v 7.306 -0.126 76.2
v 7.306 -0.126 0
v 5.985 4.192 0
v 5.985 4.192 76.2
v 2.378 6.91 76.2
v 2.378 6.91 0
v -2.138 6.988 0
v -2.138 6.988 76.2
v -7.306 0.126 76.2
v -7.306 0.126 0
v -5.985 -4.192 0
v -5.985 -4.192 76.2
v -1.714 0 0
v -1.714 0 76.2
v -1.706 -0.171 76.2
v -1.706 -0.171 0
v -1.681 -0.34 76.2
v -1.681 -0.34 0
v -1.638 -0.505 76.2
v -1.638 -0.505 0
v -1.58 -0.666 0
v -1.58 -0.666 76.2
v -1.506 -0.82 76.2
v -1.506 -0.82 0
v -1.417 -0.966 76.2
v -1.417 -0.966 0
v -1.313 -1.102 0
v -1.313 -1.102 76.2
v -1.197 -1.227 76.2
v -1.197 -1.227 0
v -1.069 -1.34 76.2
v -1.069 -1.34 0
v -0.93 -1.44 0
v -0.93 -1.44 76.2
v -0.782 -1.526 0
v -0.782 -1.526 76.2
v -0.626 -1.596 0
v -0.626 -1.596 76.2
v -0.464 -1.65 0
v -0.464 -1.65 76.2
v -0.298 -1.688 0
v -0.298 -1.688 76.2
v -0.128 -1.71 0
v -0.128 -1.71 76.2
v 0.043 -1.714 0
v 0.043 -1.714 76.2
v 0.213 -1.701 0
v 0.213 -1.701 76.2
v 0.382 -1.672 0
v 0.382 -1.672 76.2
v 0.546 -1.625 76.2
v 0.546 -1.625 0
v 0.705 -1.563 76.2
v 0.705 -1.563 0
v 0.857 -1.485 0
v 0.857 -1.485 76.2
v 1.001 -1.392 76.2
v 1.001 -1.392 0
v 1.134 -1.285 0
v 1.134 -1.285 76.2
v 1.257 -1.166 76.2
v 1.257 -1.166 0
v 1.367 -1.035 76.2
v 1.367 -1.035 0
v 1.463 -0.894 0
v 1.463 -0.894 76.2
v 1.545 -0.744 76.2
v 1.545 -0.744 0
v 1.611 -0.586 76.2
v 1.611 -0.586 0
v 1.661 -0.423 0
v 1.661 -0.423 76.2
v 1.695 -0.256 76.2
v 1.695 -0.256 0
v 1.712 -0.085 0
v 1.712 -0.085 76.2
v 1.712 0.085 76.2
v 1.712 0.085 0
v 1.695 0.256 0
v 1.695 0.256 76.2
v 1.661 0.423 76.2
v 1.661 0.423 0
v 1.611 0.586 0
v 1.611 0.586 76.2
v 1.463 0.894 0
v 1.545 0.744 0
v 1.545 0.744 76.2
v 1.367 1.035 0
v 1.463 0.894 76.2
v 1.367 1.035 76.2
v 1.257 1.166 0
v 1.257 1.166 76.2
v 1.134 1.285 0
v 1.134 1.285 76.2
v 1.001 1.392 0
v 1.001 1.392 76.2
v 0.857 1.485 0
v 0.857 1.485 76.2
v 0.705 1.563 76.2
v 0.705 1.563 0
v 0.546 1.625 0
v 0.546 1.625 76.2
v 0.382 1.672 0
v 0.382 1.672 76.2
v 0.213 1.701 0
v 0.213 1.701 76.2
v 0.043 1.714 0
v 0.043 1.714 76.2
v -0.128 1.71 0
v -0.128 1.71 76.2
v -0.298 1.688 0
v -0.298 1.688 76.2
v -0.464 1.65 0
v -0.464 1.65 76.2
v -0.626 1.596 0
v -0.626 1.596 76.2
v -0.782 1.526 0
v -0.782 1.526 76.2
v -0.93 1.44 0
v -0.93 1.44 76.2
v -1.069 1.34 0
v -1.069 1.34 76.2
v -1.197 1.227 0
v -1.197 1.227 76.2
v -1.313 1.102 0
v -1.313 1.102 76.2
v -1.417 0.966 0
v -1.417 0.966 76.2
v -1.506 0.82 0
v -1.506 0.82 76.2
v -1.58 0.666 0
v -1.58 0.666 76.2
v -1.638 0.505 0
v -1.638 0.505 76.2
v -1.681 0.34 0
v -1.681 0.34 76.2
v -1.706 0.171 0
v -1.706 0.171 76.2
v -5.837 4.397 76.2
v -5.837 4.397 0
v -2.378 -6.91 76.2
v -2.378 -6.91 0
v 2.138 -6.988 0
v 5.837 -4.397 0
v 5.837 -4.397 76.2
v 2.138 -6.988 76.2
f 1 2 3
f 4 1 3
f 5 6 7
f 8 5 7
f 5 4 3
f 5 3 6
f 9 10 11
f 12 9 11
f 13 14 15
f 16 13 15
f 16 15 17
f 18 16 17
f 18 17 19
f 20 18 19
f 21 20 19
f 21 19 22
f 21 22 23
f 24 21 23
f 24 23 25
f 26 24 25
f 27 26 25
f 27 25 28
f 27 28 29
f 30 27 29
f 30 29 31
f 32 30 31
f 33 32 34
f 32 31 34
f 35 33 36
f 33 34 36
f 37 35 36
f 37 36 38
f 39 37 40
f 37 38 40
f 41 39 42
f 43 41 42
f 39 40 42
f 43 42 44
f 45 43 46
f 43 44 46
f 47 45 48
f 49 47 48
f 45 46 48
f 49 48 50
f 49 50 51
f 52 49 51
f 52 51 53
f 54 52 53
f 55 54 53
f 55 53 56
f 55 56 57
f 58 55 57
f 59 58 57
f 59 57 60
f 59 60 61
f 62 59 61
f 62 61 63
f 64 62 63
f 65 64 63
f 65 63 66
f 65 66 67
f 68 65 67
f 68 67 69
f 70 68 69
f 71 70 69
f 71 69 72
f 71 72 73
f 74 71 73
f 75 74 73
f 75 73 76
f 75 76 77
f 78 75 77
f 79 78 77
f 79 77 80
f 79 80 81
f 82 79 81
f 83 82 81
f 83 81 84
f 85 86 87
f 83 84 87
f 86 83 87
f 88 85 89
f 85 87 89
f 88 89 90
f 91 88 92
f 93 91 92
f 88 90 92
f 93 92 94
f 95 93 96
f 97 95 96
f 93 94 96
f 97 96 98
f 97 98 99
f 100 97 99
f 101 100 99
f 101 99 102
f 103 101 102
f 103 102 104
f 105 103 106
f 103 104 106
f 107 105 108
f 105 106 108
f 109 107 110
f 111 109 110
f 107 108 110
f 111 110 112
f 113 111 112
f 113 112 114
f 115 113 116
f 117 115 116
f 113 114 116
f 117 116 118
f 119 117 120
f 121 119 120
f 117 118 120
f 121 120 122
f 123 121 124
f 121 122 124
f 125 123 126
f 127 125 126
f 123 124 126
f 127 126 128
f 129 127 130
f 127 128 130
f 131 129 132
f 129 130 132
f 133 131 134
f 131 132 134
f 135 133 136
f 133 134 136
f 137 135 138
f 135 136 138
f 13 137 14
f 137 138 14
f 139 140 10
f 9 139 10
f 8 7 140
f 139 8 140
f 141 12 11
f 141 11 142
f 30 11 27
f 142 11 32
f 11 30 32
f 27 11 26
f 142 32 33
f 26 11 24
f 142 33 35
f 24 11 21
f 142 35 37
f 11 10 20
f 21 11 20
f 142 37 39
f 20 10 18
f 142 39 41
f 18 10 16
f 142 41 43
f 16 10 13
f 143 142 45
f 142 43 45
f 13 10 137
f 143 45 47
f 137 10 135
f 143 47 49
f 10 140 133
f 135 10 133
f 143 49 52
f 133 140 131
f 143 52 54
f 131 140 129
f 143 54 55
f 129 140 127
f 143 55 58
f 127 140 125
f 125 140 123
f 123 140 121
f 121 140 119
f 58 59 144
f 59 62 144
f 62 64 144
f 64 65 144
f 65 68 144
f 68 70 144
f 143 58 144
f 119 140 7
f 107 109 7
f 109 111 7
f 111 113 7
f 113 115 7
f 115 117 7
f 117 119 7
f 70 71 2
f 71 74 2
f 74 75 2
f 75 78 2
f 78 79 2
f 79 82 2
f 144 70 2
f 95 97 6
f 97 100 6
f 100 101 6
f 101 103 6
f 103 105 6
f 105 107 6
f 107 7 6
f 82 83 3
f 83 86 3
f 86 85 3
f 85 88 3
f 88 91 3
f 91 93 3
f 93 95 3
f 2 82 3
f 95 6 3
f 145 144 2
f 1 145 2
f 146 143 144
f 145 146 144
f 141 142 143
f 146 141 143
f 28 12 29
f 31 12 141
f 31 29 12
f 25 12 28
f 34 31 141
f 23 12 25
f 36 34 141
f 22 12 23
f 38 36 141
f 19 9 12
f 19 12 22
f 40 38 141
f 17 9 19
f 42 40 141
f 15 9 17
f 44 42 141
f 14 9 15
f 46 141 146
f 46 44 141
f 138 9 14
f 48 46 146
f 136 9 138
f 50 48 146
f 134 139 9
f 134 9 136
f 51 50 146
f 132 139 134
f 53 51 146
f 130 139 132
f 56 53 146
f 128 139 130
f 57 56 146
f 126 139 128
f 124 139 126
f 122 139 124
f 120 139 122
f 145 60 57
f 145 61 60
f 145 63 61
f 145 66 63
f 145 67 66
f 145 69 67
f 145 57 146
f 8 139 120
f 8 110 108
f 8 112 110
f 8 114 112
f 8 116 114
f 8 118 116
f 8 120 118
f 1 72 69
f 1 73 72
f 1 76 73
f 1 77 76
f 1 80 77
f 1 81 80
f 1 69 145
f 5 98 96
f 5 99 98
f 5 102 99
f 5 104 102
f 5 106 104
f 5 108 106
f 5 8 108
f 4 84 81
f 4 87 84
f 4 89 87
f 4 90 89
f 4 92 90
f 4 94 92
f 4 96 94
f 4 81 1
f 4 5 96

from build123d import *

# Parameters (mm, degrees)
F1_DEPTH = 76.2
F3_D     = 3.429


with BuildPart() as f1:
    # F0 (on Top) → F1 (new body)
    with BuildSketch(Plane.XY):
        Polygon((-7.306218, 0.126358), (-5.985126, -4.192261), (-2.37792, -6.909579), (2.137572, -6.987673), (5.836583, -4.396713), (7.306218, -0.126358), (5.985126, 4.192261), (2.37792, 6.909579), (-2.137572, 6.987673), (-5.836583, 4.396713), align=None)
    extrude(amount=F1_DEPTH)

    # F3 (through all)
    with Locations(Plane(origin=(0, 0, 0), x_dir=(1, 0, 0), z_dir=(0, 0, -1))):
        with Locations((0, 0)):
            Hole(F3_D / 2)


solid = f1.part
